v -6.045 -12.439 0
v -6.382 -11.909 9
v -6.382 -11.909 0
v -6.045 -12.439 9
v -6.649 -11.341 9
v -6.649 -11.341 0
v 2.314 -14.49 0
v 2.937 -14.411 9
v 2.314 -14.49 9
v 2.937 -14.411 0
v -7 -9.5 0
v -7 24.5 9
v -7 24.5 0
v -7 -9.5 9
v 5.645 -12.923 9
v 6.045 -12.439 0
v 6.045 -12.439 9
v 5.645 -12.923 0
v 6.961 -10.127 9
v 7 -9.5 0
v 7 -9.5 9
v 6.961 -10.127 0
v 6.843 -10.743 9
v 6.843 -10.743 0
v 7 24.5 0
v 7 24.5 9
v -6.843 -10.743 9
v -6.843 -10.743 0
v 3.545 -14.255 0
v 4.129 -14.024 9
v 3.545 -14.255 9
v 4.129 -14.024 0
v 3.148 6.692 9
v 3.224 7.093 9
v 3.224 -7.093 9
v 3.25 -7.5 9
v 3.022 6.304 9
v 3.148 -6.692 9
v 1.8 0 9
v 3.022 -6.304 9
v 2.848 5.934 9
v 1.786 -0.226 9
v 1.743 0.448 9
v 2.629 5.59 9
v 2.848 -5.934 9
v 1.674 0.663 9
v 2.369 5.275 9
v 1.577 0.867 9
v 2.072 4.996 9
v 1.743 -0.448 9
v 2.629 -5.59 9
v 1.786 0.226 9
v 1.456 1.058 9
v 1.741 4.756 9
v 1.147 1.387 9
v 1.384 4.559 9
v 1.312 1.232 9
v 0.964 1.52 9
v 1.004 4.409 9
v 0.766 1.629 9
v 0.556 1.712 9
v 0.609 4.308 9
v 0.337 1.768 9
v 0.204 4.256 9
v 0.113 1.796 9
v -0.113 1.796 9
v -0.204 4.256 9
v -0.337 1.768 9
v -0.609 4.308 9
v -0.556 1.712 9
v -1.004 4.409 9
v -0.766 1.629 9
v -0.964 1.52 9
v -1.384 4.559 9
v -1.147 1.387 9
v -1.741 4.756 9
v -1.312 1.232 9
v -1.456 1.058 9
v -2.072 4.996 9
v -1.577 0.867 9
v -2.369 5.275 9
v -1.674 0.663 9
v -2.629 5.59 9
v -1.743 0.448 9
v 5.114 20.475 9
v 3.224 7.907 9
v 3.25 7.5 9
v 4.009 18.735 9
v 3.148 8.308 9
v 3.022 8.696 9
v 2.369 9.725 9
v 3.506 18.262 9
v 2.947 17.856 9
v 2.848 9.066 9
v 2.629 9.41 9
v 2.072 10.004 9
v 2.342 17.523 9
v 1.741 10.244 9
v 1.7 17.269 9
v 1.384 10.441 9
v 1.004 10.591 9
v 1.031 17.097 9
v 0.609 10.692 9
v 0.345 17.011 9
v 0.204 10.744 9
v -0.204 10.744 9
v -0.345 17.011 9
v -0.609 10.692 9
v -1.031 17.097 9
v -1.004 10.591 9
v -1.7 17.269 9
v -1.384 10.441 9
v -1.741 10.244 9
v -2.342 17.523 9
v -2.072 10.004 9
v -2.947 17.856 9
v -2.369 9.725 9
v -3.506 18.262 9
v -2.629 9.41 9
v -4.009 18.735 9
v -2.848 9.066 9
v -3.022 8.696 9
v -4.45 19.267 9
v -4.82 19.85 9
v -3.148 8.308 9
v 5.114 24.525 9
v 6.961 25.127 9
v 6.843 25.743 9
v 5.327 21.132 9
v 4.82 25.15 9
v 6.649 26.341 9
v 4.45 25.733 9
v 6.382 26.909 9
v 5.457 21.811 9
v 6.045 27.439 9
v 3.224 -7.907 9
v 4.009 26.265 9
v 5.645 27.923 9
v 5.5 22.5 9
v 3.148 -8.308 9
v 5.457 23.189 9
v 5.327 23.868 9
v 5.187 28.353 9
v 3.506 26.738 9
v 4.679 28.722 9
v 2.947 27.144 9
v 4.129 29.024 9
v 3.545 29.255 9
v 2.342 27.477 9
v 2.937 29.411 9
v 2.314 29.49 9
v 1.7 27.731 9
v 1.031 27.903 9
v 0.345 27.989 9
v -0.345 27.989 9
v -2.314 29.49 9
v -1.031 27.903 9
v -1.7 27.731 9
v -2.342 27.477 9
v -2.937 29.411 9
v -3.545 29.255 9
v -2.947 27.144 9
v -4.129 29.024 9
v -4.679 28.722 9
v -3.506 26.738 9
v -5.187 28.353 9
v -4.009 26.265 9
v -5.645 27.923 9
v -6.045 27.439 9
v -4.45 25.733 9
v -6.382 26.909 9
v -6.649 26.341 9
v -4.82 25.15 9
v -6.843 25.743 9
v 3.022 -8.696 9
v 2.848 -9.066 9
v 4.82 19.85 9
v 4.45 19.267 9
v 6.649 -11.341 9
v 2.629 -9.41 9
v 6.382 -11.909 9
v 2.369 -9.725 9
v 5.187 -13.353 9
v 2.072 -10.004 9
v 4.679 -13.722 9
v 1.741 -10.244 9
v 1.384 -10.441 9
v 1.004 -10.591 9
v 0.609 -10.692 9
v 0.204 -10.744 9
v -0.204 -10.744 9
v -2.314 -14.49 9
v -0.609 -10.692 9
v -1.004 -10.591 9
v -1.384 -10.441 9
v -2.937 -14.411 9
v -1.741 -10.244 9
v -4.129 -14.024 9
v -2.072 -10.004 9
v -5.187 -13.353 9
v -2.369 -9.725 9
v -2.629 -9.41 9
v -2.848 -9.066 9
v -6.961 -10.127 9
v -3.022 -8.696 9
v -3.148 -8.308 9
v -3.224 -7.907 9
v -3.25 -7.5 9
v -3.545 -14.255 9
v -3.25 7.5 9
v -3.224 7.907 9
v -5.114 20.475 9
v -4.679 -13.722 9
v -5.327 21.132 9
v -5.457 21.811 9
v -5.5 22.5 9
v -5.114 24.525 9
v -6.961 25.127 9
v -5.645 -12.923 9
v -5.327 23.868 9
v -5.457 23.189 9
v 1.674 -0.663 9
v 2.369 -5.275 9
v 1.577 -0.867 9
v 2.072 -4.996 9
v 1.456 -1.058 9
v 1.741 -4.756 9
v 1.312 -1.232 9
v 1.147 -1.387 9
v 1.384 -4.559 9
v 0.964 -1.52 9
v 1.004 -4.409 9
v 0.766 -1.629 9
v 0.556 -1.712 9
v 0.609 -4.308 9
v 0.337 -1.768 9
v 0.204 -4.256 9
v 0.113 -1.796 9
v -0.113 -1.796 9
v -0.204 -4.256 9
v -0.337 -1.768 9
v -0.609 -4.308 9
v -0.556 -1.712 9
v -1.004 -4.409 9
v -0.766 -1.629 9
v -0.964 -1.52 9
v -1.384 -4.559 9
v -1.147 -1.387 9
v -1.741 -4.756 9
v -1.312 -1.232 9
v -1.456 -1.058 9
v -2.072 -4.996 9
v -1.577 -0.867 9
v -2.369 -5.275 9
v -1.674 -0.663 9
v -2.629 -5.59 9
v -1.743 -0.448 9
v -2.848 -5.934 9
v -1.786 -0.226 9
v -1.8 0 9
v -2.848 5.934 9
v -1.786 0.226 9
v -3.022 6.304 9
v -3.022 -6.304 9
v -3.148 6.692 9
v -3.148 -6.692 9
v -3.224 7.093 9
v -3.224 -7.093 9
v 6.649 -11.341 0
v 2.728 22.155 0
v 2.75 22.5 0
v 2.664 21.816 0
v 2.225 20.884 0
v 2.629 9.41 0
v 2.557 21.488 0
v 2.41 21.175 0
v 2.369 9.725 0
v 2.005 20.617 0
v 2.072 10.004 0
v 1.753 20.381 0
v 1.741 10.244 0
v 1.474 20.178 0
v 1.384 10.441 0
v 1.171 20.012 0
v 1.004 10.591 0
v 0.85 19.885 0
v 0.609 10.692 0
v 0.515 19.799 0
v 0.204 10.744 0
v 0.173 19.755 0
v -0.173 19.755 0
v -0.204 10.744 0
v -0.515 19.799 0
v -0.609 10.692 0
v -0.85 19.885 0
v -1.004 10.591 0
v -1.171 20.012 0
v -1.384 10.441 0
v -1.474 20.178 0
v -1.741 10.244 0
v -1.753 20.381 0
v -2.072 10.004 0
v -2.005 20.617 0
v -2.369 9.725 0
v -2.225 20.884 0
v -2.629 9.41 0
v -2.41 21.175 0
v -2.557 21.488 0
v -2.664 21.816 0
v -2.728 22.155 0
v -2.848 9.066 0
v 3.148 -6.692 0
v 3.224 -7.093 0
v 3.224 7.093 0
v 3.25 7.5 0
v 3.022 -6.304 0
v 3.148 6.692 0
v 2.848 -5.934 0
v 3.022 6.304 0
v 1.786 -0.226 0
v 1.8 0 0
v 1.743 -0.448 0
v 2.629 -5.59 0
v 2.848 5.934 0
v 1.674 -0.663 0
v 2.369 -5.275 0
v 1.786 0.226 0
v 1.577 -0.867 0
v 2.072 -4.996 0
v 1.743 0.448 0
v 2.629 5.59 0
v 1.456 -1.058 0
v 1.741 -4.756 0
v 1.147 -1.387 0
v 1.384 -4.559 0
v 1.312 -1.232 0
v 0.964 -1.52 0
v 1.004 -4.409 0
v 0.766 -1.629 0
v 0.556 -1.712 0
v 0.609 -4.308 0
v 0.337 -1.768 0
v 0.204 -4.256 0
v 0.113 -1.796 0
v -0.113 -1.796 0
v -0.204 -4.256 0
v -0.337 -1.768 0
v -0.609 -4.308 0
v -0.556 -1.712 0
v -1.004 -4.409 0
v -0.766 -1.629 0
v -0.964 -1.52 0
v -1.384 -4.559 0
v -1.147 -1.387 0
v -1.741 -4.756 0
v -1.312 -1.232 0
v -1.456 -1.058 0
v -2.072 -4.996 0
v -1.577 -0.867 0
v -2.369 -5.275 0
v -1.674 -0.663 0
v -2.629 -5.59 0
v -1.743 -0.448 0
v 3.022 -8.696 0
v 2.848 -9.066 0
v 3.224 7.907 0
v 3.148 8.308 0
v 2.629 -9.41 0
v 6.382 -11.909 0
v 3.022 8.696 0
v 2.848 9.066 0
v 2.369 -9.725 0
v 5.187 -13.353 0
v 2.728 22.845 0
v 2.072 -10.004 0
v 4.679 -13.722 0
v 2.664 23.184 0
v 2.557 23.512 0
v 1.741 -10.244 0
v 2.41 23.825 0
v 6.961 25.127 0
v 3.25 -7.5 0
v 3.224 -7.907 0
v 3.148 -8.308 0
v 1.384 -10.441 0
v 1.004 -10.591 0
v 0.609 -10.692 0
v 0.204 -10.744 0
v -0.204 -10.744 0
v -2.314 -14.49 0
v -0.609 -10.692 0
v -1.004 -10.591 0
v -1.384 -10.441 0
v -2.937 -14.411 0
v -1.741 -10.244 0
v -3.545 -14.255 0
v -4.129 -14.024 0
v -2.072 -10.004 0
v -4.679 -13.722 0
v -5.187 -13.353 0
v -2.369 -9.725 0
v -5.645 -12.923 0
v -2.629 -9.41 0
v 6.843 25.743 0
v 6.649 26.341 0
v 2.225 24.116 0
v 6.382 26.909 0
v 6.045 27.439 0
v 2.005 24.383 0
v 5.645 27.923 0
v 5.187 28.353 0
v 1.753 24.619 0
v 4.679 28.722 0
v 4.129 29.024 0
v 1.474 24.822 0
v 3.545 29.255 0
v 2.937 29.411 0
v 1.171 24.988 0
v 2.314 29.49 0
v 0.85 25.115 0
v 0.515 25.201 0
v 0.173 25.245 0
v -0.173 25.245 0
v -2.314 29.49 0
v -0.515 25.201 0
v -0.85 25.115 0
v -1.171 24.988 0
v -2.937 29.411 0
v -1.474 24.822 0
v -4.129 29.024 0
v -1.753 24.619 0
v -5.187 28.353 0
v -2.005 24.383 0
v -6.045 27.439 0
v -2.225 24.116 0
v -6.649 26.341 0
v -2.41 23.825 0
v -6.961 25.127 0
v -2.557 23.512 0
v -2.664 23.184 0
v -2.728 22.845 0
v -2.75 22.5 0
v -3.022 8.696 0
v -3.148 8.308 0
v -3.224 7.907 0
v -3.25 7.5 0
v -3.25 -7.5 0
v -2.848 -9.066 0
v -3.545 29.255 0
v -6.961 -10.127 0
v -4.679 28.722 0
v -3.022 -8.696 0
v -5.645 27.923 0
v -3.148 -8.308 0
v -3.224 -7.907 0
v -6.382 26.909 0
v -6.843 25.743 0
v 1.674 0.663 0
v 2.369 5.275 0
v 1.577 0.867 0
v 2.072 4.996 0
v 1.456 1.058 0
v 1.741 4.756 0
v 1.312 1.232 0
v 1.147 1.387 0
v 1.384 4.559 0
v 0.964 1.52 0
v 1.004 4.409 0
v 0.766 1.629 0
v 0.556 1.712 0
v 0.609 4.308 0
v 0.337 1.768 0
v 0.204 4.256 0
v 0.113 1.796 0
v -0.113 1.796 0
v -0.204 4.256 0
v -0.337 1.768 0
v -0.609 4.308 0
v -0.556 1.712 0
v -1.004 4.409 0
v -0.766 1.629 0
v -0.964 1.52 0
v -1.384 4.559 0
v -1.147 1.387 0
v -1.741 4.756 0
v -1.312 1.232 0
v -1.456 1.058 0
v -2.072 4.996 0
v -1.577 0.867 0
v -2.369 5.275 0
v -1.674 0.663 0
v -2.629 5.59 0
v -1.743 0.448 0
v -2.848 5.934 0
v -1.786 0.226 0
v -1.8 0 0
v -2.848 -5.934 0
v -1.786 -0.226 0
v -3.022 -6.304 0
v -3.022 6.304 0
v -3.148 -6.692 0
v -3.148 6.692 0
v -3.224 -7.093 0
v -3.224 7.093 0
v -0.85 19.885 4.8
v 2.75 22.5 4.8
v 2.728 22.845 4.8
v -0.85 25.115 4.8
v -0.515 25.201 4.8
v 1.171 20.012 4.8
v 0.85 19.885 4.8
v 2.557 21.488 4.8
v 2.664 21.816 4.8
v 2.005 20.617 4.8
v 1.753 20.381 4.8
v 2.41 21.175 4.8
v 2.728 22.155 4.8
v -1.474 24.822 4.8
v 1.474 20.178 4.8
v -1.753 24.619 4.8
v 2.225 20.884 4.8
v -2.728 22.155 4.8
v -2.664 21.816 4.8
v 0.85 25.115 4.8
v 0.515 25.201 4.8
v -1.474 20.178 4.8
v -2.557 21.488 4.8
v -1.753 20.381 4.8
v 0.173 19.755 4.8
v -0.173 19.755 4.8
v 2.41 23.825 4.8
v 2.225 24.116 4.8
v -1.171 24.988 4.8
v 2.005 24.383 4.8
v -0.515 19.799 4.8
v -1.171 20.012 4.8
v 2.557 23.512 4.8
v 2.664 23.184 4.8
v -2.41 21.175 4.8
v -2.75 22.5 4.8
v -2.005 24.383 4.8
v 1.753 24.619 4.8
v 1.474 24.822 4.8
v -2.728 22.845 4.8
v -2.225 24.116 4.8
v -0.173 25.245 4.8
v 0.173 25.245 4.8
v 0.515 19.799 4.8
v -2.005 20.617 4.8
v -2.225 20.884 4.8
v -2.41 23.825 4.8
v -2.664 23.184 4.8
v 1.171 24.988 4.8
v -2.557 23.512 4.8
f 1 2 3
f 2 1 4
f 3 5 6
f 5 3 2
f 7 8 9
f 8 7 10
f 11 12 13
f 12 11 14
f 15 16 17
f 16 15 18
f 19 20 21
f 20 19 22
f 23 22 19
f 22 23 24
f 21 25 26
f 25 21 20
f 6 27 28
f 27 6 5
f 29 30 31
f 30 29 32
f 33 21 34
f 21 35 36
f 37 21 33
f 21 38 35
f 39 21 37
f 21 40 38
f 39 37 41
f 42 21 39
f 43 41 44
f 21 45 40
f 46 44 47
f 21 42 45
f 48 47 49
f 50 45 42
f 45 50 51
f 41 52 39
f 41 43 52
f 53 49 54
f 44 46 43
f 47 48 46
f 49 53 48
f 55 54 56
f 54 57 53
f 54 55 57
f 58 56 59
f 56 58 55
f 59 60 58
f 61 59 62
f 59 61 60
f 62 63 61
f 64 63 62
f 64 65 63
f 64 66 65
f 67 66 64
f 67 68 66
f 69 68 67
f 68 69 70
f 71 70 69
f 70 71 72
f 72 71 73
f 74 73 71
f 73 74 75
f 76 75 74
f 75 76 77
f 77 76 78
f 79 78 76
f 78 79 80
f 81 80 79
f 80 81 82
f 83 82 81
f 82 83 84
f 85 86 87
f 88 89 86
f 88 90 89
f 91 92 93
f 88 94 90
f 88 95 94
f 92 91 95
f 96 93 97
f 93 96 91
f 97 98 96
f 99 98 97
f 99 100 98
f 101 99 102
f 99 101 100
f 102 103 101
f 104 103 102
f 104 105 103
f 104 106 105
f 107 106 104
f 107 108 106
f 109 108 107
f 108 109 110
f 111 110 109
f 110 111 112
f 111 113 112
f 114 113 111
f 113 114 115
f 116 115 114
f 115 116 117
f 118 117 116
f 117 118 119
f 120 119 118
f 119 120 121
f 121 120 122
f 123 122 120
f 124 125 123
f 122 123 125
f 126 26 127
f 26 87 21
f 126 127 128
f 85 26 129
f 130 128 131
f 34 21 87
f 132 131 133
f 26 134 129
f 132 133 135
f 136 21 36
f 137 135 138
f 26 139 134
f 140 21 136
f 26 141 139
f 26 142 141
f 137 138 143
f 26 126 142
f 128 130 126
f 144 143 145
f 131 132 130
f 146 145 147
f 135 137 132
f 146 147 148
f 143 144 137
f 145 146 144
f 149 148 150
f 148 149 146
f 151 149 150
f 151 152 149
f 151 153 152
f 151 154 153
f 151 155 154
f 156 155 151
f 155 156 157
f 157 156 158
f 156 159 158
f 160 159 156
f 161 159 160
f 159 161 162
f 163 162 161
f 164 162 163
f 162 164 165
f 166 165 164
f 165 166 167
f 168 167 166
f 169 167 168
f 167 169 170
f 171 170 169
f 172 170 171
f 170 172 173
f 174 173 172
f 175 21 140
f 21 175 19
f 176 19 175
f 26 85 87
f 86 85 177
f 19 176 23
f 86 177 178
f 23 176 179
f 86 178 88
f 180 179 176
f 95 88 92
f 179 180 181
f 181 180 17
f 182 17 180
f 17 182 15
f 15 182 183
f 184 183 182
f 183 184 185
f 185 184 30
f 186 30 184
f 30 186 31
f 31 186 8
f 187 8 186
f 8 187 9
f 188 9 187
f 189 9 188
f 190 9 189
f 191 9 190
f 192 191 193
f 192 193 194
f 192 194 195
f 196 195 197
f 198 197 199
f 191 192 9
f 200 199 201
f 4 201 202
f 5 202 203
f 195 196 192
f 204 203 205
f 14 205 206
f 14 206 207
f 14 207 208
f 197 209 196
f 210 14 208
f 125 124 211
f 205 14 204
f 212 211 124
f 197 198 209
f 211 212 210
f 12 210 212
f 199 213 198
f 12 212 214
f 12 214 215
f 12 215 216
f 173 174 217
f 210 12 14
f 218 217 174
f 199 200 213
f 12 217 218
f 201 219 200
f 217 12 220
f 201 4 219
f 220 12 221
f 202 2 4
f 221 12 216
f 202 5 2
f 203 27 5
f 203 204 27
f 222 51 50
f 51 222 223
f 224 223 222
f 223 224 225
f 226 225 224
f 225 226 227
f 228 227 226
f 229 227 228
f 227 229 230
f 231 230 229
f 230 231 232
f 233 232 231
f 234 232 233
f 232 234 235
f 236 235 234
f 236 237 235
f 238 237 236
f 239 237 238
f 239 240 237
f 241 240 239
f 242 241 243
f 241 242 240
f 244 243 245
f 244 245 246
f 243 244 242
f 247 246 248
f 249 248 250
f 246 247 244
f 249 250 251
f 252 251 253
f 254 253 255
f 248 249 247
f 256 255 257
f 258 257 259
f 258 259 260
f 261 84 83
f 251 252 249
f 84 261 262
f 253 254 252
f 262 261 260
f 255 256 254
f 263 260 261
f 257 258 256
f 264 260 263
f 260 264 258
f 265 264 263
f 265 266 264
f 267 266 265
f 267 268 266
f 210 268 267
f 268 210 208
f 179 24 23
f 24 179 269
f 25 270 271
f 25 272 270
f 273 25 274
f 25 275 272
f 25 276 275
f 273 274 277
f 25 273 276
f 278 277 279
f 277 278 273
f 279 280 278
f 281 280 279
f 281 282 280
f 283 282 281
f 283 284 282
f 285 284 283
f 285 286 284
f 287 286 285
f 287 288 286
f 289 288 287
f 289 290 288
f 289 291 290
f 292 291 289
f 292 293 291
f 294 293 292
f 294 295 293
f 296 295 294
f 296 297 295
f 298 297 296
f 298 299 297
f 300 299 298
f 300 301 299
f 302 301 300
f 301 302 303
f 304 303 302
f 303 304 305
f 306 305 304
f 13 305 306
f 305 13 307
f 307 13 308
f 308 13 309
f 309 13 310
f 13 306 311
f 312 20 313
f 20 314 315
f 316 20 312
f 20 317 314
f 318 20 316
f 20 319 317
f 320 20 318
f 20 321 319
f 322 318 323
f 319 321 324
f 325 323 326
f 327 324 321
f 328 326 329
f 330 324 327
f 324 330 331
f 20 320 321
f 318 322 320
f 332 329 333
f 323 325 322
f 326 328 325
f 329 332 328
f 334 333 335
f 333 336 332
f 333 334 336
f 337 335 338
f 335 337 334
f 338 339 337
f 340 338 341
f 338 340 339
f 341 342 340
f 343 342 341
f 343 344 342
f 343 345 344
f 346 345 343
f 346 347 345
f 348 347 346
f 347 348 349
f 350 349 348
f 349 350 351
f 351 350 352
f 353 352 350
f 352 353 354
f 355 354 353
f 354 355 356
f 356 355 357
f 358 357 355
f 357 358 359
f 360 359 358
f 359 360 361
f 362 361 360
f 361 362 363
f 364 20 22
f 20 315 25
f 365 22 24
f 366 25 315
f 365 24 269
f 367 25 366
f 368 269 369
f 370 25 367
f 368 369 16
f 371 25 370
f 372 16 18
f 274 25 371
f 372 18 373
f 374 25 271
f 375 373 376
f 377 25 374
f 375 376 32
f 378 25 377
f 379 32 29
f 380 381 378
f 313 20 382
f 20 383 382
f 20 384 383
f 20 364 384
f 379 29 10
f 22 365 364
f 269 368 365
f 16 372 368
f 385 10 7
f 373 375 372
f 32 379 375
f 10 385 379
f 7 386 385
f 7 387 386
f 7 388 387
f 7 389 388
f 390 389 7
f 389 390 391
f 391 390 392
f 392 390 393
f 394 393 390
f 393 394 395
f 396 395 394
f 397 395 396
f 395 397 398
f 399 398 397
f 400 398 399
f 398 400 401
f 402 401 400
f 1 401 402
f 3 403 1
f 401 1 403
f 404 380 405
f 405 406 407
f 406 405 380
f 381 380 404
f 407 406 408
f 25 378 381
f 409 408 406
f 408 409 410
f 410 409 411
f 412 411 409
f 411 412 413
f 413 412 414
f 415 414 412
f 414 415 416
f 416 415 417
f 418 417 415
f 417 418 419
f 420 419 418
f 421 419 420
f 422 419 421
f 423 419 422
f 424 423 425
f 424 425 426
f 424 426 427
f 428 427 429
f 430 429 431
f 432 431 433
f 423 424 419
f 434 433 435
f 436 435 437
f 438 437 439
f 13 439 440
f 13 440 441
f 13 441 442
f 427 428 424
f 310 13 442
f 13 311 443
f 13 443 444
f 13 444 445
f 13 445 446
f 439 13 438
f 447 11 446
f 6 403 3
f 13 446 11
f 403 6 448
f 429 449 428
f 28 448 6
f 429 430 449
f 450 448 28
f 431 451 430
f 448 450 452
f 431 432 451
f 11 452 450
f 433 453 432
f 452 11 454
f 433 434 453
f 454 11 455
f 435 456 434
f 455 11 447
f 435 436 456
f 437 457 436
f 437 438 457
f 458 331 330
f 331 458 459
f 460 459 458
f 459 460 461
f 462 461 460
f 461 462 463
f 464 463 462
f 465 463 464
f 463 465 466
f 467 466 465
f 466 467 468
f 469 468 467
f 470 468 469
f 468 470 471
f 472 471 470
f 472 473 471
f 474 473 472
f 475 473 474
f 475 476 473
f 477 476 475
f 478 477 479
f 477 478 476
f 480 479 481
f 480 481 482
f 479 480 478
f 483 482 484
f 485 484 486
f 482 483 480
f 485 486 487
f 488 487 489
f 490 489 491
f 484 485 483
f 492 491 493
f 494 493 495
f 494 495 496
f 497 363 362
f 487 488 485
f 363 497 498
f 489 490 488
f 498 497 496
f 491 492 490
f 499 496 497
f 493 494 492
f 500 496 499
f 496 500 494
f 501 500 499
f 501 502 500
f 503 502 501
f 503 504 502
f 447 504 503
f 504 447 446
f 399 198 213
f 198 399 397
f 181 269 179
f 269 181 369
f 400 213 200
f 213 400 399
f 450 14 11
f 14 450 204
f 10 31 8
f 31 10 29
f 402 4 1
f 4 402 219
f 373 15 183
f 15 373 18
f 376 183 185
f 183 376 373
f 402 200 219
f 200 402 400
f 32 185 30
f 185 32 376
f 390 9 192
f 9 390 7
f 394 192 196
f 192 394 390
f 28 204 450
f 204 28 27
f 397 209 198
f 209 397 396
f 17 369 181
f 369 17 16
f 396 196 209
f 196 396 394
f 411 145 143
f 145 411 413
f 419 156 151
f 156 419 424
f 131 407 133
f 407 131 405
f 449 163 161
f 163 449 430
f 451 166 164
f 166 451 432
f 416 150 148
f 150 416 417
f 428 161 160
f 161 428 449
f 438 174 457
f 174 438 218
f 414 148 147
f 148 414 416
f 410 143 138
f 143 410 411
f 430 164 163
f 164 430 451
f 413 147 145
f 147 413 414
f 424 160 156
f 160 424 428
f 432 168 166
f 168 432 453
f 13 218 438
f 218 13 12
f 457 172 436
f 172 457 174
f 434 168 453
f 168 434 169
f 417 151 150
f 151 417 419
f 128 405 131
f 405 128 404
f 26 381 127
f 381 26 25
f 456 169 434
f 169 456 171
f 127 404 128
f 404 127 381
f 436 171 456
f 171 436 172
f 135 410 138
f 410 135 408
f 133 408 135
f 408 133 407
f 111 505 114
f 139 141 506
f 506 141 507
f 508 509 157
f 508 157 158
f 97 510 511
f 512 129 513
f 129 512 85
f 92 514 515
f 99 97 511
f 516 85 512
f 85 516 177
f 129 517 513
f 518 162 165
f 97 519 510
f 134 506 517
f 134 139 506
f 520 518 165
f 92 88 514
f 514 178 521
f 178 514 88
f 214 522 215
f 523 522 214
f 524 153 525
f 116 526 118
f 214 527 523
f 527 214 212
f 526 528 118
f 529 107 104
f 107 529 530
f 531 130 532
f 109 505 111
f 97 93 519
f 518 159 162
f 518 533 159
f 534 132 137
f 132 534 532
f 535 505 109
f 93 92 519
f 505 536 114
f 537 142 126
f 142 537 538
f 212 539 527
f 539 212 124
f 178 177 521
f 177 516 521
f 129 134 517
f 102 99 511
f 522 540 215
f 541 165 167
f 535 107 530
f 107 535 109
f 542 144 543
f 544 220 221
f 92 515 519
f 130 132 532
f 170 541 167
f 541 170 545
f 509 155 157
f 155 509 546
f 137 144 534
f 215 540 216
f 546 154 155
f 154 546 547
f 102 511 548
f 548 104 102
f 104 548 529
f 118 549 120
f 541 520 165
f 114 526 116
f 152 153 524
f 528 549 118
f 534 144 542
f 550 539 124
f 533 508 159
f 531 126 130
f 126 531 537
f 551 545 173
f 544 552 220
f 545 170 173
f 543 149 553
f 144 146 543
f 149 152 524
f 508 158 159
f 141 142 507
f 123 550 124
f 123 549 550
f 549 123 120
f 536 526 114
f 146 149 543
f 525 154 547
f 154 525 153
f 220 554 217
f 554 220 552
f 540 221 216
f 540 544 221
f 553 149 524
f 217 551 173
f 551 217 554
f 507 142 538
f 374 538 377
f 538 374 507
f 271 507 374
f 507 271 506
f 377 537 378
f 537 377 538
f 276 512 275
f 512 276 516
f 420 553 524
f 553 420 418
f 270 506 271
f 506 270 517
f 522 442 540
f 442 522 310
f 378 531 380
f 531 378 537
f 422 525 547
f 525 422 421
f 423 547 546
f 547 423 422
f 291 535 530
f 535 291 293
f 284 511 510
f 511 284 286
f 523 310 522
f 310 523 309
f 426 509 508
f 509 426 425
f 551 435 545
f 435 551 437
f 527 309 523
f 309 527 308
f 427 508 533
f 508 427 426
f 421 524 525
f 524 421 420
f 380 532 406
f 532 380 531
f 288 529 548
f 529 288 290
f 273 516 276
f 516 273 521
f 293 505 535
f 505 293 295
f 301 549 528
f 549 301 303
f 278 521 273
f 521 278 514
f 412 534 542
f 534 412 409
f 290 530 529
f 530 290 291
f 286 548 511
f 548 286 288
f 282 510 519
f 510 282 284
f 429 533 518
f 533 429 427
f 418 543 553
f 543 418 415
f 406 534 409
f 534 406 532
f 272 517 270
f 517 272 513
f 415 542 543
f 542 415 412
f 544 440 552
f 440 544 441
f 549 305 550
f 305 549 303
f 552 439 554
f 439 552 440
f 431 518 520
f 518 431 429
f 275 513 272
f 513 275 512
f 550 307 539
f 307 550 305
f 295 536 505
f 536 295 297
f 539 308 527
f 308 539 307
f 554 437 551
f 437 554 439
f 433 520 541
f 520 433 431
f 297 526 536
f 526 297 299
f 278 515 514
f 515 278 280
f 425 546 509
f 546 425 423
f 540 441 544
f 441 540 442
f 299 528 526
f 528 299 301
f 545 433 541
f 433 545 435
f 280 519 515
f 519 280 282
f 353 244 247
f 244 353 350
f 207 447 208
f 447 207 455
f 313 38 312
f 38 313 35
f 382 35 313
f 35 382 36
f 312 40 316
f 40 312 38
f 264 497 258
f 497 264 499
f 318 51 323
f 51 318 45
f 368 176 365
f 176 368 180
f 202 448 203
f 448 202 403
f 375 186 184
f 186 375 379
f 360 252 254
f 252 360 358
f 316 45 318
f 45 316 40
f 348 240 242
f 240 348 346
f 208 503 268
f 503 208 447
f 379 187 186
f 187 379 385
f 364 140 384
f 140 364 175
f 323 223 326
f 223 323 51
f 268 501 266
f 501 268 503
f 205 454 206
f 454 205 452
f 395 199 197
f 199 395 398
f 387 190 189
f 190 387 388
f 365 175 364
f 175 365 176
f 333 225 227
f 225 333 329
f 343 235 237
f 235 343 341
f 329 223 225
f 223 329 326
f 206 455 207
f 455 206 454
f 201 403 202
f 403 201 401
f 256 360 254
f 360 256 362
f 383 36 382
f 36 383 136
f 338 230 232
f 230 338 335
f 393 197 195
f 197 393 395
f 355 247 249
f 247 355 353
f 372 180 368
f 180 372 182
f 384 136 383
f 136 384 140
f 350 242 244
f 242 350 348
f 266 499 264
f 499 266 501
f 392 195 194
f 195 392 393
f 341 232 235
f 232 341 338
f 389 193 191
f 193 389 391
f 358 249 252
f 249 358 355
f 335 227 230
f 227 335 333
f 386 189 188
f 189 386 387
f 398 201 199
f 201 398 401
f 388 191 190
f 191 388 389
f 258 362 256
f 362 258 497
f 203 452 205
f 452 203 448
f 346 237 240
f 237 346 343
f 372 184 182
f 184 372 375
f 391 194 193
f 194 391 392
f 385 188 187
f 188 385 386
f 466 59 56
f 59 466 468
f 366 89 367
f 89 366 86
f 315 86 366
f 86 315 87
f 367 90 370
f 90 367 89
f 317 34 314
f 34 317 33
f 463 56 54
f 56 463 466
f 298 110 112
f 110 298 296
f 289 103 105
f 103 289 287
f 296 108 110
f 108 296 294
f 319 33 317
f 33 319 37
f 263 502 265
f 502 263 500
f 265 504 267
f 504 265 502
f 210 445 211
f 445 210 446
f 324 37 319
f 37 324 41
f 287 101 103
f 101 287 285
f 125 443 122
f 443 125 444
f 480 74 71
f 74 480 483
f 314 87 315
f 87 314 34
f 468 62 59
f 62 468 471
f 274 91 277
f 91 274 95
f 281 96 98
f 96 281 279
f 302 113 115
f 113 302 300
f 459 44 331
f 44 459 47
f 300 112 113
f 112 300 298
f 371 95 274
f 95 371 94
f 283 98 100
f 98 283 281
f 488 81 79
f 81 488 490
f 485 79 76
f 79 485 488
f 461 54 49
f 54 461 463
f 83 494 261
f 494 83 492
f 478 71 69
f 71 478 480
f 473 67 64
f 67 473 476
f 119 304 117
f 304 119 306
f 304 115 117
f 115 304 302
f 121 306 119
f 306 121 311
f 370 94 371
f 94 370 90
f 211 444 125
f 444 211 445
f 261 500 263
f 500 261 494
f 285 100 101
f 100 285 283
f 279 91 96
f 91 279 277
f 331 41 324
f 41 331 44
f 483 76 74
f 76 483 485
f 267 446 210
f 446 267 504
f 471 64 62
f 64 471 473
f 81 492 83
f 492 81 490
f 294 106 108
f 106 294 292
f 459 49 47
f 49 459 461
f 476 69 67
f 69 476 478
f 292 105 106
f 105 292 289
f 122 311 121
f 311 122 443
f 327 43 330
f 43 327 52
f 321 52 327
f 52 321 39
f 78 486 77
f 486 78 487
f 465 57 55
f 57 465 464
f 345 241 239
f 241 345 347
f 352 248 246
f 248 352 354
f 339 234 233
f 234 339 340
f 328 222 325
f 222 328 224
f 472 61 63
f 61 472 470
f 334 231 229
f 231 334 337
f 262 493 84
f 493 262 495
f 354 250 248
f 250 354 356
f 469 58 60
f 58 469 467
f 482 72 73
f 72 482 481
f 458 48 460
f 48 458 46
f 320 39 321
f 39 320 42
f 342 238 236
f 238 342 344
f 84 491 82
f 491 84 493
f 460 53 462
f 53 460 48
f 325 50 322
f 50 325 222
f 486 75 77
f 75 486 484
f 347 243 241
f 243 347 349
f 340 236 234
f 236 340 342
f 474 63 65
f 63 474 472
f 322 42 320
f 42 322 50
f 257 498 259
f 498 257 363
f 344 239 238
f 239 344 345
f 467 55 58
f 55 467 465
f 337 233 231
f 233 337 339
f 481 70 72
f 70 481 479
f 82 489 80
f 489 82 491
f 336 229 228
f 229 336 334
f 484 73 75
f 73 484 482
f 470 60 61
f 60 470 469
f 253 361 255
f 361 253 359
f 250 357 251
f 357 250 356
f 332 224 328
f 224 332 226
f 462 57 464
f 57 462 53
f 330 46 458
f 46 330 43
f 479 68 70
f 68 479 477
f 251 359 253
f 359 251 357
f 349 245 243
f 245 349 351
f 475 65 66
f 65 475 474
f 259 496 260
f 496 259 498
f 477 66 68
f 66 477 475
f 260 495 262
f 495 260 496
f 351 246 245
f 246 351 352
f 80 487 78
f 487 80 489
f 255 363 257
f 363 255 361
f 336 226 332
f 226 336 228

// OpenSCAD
$fn = 50;


difference() {
	union() {
		hull() {
			translate(v = [-2.0000000000, 9.5000000000, 0]) {
				cylinder(h = 9, r = 5);
			}
			translate(v = [2.0000000000, 9.5000000000, 0]) {
				cylinder(h = 9, r = 5);
			}
			translate(v = [-2.0000000000, -9.5000000000, 0]) {
				cylinder(h = 9, r = 5);
			}
			translate(v = [2.0000000000, -9.5000000000, 0]) {
				cylinder(h = 9, r = 5);
			}
		}
		translate(v = [0.0000000000, 15.0000000000, 0]) {
			hull() {
				translate(v = [-2.0000000000, 9.5000000000, 0]) {
					cylinder(h = 9, r = 5);
				}
				translate(v = [2.0000000000, 9.5000000000, 0]) {
					cylinder(h = 9, r = 5);
				}
				translate(v = [-2.0000000000, -9.5000000000, 0]) {
					cylinder(h = 9, r = 5);
				}
				translate(v = [2.0000000000, -9.5000000000, 0]) {
					cylinder(h = 9, r = 5);
				}
			}
		}
		translate(v = [0.0000000000, 15.0000000000, 0]) {
			hull() {
				translate(v = [-2.0000000000, 9.5000000000, 0]) {
					cylinder(h = 9, r = 5);
				}
				translate(v = [2.0000000000, 9.5000000000, 0]) {
					cylinder(h = 9, r = 5);
				}
				translate(v = [-2.0000000000, -9.5000000000, 0]) {
					cylinder(h = 9, r = 5);
				}
				translate(v = [2.0000000000, -9.5000000000, 0]) {
					cylinder(h = 9, r = 5);
				}
			}
		}
	}
	union() {
		translate(v = [0.0000000000, 22.5000000000, 9]) {
			rotate(a = [0, 0, 0]) {
				difference() {
					union() {
						#translate(v = [0, 0, -9.0000000000]) {
							cylinder(h = 9, r = 2.2500000000);
						}
						#translate(v = [0, 0, -4.2000000000]) {
							cylinder(h = 4.2000000000, r1 = 2.7500000000, r2 = 5.5000000000);
						}
						#translate(v = [0, 0, -9.0000000000]) {
							cylinder(h = 9, r = 2.7500000000);
						}
						#translate(v = [0, 0, -9.0000000000]) {
							cylinder(h = 9, r = 2.2500000000);
						}
					}
					union();
				}
			}
		}
		translate(v = [0.0000000000, 22.5000000000, 9]) {
			rotate(a = [0, 0, 0]) {
				difference() {
					union() {
						#translate(v = [0, 0, -9.0000000000]) {
							cylinder(h = 9, r = 2.2500000000);
						}
						#translate(v = [0, 0, -4.2000000000]) {
							cylinder(h = 4.2000000000, r1 = 2.7500000000, r2 = 5.5000000000);
						}
						#translate(v = [0, 0, -9.0000000000]) {
							cylinder(h = 9, r = 2.7500000000);
						}
						#translate(v = [0, 0, -9.0000000000]) {
							cylinder(h = 9, r = 2.2500000000);
						}
					}
					union();
				}
			}
		}
		translate(v = [0.0000000000, -7.5000000000, 0]) {
			translate(v = [0, 0, -100]) {
				cylinder(h = 200, r = 3.2500000000);
			}
		}
		translate(v = [0.0000000000, 7.5000000000, 0]) {
			translate(v = [0, 0, -100]) {
				cylinder(h = 200, r = 3.2500000000);
			}
		}
		translate(v = [0.0000000000, -7.5000000000, 0]) {
			translate(v = [0, 0, -100]) {
				cylinder(h = 200, r = 1.8000000000);
			}
		}
		translate(v = [0, 0, -100]) {
			cylinder(h = 200, r = 1.8000000000);
		}
		translate(v = [0.0000000000, 7.5000000000, 0]) {
			translate(v = [0, 0, -100]) {
				cylinder(h = 200, r = 1.8000000000);
			}
		}
	}
}
